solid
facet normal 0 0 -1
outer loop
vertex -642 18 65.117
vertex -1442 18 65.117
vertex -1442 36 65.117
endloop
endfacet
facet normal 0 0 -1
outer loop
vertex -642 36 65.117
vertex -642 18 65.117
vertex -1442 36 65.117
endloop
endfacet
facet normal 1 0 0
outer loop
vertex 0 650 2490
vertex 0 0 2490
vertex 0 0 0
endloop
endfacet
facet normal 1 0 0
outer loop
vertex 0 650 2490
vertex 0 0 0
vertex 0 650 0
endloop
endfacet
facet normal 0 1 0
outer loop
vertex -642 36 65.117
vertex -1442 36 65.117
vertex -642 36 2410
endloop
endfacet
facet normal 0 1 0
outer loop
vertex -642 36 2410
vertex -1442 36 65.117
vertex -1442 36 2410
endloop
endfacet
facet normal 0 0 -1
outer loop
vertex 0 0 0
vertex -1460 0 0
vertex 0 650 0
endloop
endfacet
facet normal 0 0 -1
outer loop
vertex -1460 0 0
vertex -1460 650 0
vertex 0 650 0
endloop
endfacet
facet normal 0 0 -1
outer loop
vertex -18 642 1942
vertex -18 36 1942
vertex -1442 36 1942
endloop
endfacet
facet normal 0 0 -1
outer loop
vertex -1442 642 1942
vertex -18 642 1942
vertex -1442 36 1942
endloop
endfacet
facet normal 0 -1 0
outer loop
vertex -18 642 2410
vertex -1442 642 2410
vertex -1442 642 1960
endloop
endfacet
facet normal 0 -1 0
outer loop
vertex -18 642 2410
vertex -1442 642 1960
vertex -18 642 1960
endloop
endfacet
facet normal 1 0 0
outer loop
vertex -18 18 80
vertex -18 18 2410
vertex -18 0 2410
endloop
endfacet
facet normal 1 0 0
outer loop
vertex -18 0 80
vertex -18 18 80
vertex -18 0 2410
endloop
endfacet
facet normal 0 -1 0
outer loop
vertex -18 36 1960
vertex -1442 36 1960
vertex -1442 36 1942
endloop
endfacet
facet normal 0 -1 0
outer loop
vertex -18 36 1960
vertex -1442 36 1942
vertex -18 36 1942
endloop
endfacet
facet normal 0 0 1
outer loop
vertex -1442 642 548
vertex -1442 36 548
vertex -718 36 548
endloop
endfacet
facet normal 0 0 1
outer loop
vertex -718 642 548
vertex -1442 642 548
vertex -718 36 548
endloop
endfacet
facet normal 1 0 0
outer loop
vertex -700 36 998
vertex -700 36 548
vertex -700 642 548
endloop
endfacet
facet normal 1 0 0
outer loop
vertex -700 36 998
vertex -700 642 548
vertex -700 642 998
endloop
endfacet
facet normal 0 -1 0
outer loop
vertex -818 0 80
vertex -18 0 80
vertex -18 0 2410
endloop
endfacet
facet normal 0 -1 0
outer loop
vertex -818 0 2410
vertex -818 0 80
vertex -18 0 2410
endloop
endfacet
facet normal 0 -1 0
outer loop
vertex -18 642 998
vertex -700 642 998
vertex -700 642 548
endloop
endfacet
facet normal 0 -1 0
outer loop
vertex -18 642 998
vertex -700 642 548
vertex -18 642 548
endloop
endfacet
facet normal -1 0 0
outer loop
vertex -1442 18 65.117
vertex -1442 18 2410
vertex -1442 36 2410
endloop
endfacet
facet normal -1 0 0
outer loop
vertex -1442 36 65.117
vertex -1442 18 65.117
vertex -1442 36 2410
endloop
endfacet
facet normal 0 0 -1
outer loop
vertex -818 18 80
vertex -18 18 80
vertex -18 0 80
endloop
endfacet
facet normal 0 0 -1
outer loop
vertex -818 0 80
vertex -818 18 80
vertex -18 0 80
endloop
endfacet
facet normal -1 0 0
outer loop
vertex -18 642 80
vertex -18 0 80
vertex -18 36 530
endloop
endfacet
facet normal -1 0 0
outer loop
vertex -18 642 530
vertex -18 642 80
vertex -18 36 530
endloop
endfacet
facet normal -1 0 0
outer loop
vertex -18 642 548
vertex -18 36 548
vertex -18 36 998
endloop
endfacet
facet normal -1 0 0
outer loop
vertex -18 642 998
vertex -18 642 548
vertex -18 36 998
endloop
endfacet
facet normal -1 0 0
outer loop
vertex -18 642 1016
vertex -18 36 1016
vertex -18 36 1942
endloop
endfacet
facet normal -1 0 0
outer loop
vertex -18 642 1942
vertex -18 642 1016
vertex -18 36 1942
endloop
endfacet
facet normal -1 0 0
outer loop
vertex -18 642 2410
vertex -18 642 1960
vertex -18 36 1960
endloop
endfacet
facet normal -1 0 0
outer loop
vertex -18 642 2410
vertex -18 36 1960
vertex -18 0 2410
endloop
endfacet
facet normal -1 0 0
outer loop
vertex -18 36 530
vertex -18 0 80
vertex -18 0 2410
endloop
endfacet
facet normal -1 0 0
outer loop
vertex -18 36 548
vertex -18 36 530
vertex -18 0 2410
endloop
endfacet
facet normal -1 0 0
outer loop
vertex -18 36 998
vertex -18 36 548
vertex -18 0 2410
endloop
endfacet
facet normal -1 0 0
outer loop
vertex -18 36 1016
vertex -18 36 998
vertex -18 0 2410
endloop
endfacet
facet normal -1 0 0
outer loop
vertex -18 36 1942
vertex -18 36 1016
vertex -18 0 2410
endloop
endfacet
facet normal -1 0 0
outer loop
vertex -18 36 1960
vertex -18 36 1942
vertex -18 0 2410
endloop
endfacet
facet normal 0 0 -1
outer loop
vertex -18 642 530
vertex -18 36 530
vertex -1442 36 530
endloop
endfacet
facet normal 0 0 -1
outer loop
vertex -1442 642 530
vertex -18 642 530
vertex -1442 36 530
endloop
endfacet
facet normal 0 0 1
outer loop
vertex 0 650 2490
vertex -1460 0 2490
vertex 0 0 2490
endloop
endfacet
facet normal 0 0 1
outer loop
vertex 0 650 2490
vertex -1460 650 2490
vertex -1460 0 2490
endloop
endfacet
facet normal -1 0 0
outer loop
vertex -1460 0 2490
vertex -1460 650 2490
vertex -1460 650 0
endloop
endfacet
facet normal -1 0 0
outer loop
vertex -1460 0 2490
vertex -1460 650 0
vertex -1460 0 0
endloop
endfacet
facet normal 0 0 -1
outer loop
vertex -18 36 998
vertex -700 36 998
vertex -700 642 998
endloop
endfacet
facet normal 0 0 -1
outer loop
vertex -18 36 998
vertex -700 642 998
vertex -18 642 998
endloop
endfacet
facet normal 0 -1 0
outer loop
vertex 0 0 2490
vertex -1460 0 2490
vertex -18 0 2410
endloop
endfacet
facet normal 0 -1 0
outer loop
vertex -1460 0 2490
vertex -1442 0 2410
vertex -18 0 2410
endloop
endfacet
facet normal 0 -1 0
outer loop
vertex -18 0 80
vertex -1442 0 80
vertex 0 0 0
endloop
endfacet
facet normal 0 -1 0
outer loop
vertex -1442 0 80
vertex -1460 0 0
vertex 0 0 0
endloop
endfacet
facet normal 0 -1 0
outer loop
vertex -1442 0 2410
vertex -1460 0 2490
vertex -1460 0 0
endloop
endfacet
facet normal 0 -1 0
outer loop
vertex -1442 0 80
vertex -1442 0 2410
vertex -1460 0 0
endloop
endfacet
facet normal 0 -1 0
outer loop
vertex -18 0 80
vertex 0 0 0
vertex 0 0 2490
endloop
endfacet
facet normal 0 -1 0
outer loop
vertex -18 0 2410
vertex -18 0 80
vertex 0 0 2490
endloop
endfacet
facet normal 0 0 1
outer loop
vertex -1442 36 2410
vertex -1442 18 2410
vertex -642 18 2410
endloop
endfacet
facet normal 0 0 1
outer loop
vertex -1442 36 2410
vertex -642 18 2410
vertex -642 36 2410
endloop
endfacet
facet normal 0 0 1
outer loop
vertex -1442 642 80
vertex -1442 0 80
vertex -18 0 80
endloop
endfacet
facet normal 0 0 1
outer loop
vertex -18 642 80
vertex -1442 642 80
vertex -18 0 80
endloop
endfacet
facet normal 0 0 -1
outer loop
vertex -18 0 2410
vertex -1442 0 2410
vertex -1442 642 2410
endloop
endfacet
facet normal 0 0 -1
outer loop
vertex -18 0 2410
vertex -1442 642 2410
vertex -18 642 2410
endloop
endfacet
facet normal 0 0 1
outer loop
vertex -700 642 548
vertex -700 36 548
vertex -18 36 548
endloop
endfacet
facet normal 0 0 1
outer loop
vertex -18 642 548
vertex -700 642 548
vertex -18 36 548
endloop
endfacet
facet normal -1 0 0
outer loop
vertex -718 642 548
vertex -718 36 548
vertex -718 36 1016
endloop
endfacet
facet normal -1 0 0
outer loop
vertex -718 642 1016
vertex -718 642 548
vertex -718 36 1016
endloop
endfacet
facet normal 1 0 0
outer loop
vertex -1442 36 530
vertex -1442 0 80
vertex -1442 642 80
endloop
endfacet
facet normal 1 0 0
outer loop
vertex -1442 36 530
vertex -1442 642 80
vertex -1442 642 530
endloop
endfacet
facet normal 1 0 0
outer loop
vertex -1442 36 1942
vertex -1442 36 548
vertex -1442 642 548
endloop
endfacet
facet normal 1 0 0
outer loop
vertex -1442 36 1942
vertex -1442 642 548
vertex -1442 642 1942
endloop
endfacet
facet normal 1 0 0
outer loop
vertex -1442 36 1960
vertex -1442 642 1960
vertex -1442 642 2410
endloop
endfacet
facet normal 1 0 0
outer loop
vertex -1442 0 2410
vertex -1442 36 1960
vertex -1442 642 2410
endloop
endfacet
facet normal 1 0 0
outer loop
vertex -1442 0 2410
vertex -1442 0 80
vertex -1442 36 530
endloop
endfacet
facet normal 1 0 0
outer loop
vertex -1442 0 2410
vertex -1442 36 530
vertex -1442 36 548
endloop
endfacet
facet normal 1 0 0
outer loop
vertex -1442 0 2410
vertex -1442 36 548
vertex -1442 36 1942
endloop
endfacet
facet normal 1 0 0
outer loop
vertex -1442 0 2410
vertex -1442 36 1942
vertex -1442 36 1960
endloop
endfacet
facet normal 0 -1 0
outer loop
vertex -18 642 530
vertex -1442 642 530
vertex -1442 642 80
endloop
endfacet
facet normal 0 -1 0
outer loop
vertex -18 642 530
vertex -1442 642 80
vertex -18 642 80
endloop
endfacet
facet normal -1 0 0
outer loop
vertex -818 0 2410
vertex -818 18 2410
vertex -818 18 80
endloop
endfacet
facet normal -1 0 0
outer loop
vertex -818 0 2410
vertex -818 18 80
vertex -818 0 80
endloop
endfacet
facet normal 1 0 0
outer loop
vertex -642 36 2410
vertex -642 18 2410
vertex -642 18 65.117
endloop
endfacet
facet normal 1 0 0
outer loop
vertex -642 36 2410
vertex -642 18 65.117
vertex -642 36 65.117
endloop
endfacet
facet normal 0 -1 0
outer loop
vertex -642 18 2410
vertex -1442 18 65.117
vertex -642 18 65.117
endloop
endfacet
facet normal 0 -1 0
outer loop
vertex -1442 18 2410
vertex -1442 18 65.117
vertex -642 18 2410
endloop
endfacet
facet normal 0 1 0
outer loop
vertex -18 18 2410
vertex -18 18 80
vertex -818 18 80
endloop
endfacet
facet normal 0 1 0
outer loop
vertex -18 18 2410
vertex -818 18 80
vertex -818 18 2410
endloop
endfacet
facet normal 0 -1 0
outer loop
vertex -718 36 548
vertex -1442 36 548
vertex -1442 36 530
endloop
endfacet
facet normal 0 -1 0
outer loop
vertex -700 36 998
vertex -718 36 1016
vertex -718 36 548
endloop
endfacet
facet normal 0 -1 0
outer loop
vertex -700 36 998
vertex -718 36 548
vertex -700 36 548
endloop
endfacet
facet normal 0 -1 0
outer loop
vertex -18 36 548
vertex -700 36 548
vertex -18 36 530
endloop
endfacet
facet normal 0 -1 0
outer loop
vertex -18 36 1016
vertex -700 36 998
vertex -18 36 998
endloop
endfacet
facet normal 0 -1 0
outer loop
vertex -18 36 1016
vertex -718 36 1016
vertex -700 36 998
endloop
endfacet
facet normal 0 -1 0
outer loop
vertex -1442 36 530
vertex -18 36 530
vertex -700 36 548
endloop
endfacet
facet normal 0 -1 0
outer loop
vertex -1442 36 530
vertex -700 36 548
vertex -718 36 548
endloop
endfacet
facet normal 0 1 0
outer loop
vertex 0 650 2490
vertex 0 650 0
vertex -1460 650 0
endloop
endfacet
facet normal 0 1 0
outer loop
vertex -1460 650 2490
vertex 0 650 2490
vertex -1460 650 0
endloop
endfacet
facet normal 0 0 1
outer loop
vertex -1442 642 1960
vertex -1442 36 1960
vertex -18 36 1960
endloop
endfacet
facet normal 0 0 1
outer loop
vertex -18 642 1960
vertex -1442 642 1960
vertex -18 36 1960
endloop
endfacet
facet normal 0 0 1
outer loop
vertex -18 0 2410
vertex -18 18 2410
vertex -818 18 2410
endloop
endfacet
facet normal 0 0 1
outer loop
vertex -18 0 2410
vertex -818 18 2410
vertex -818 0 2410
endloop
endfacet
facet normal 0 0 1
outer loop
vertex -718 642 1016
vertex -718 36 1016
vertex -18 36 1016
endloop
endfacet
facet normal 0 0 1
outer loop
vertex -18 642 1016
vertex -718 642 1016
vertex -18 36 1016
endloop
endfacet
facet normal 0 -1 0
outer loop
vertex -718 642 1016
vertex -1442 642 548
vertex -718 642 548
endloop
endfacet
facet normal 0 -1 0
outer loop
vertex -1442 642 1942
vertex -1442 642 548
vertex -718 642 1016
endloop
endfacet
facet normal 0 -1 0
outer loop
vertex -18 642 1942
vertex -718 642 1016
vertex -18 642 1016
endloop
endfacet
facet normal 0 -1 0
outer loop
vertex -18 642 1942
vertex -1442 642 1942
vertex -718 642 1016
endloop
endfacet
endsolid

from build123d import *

# Parameters (mm, degrees)
F1_DEPTH = 2490
F2_W     = 1424
F2_H     = 2330
F3_DEPTH = 36
F4_W     = 1424
F4_H     = 450
F4_W_2   = 682
F5_DEPTH = 606
F6_W     = 18
F6_H     = 2330
F7_DEPTH = 800
F8_W     = 18
F8_H     = 2344.882574
F9_DEPTH = 800


with BuildPart() as f1:
    # F0 (on Top) → F1 (new body)
    with BuildSketch(Plane.XY):
        Polygon((-1460, 0), (0, 0), (0, 650), (-1460, 650), (-1460, 430), (-1460, 325), align=None)
    extrude(amount=F1_DEPTH)

    # F2 (on face) → F3 (cut)
    with BuildSketch(Plane.XZ):
        with Locations((-730, 1245)):
            Rectangle(F2_W, F2_H)
    extrude(amount=-F3_DEPTH, mode=Mode.SUBTRACT)

    # F4 (on face) → F5 (cut)
    with BuildSketch(Plane.XZ.offset(-36)):
        with Locations((-730, 2185)):
            Rectangle(F4_W, F4_H)
        with Locations((-359, 773)):
            Rectangle(F4_W_2, F4_H)
        Polygon((-18, 1942), (-1442, 1942), (-1442, 548), (-718, 548), (-718, 1016), (-18, 1016), align=None)
        Polygon((-18, 530), (-1442, 530), (-1442, 104.263887), (-1442, 80), (-18, 80), align=None)
    extrude(amount=-F5_DEPTH, mode=Mode.SUBTRACT)


with BuildPart() as f7:
    # F6 (on face) → F7 (new body)
    with BuildSketch(Plane(origin=(-18, 0, 0), x_dir=(0, -1, 0), z_dir=(-1, 0, 0))):
        with Locations((-9, 1245)):
            Rectangle(F6_W, F6_H)
    extrude(amount=F7_DEPTH)


with BuildPart() as f9:
    # F8 (on face) → F9 (new body)
    with BuildSketch(Plane.YZ.offset(-1442)):
        with Locations((27, 1237.558713)):
            Rectangle(F8_W, F8_H)
    extrude(amount=F9_DEPTH)


solid = Compound([f1.part, f7.part, f9.part])
